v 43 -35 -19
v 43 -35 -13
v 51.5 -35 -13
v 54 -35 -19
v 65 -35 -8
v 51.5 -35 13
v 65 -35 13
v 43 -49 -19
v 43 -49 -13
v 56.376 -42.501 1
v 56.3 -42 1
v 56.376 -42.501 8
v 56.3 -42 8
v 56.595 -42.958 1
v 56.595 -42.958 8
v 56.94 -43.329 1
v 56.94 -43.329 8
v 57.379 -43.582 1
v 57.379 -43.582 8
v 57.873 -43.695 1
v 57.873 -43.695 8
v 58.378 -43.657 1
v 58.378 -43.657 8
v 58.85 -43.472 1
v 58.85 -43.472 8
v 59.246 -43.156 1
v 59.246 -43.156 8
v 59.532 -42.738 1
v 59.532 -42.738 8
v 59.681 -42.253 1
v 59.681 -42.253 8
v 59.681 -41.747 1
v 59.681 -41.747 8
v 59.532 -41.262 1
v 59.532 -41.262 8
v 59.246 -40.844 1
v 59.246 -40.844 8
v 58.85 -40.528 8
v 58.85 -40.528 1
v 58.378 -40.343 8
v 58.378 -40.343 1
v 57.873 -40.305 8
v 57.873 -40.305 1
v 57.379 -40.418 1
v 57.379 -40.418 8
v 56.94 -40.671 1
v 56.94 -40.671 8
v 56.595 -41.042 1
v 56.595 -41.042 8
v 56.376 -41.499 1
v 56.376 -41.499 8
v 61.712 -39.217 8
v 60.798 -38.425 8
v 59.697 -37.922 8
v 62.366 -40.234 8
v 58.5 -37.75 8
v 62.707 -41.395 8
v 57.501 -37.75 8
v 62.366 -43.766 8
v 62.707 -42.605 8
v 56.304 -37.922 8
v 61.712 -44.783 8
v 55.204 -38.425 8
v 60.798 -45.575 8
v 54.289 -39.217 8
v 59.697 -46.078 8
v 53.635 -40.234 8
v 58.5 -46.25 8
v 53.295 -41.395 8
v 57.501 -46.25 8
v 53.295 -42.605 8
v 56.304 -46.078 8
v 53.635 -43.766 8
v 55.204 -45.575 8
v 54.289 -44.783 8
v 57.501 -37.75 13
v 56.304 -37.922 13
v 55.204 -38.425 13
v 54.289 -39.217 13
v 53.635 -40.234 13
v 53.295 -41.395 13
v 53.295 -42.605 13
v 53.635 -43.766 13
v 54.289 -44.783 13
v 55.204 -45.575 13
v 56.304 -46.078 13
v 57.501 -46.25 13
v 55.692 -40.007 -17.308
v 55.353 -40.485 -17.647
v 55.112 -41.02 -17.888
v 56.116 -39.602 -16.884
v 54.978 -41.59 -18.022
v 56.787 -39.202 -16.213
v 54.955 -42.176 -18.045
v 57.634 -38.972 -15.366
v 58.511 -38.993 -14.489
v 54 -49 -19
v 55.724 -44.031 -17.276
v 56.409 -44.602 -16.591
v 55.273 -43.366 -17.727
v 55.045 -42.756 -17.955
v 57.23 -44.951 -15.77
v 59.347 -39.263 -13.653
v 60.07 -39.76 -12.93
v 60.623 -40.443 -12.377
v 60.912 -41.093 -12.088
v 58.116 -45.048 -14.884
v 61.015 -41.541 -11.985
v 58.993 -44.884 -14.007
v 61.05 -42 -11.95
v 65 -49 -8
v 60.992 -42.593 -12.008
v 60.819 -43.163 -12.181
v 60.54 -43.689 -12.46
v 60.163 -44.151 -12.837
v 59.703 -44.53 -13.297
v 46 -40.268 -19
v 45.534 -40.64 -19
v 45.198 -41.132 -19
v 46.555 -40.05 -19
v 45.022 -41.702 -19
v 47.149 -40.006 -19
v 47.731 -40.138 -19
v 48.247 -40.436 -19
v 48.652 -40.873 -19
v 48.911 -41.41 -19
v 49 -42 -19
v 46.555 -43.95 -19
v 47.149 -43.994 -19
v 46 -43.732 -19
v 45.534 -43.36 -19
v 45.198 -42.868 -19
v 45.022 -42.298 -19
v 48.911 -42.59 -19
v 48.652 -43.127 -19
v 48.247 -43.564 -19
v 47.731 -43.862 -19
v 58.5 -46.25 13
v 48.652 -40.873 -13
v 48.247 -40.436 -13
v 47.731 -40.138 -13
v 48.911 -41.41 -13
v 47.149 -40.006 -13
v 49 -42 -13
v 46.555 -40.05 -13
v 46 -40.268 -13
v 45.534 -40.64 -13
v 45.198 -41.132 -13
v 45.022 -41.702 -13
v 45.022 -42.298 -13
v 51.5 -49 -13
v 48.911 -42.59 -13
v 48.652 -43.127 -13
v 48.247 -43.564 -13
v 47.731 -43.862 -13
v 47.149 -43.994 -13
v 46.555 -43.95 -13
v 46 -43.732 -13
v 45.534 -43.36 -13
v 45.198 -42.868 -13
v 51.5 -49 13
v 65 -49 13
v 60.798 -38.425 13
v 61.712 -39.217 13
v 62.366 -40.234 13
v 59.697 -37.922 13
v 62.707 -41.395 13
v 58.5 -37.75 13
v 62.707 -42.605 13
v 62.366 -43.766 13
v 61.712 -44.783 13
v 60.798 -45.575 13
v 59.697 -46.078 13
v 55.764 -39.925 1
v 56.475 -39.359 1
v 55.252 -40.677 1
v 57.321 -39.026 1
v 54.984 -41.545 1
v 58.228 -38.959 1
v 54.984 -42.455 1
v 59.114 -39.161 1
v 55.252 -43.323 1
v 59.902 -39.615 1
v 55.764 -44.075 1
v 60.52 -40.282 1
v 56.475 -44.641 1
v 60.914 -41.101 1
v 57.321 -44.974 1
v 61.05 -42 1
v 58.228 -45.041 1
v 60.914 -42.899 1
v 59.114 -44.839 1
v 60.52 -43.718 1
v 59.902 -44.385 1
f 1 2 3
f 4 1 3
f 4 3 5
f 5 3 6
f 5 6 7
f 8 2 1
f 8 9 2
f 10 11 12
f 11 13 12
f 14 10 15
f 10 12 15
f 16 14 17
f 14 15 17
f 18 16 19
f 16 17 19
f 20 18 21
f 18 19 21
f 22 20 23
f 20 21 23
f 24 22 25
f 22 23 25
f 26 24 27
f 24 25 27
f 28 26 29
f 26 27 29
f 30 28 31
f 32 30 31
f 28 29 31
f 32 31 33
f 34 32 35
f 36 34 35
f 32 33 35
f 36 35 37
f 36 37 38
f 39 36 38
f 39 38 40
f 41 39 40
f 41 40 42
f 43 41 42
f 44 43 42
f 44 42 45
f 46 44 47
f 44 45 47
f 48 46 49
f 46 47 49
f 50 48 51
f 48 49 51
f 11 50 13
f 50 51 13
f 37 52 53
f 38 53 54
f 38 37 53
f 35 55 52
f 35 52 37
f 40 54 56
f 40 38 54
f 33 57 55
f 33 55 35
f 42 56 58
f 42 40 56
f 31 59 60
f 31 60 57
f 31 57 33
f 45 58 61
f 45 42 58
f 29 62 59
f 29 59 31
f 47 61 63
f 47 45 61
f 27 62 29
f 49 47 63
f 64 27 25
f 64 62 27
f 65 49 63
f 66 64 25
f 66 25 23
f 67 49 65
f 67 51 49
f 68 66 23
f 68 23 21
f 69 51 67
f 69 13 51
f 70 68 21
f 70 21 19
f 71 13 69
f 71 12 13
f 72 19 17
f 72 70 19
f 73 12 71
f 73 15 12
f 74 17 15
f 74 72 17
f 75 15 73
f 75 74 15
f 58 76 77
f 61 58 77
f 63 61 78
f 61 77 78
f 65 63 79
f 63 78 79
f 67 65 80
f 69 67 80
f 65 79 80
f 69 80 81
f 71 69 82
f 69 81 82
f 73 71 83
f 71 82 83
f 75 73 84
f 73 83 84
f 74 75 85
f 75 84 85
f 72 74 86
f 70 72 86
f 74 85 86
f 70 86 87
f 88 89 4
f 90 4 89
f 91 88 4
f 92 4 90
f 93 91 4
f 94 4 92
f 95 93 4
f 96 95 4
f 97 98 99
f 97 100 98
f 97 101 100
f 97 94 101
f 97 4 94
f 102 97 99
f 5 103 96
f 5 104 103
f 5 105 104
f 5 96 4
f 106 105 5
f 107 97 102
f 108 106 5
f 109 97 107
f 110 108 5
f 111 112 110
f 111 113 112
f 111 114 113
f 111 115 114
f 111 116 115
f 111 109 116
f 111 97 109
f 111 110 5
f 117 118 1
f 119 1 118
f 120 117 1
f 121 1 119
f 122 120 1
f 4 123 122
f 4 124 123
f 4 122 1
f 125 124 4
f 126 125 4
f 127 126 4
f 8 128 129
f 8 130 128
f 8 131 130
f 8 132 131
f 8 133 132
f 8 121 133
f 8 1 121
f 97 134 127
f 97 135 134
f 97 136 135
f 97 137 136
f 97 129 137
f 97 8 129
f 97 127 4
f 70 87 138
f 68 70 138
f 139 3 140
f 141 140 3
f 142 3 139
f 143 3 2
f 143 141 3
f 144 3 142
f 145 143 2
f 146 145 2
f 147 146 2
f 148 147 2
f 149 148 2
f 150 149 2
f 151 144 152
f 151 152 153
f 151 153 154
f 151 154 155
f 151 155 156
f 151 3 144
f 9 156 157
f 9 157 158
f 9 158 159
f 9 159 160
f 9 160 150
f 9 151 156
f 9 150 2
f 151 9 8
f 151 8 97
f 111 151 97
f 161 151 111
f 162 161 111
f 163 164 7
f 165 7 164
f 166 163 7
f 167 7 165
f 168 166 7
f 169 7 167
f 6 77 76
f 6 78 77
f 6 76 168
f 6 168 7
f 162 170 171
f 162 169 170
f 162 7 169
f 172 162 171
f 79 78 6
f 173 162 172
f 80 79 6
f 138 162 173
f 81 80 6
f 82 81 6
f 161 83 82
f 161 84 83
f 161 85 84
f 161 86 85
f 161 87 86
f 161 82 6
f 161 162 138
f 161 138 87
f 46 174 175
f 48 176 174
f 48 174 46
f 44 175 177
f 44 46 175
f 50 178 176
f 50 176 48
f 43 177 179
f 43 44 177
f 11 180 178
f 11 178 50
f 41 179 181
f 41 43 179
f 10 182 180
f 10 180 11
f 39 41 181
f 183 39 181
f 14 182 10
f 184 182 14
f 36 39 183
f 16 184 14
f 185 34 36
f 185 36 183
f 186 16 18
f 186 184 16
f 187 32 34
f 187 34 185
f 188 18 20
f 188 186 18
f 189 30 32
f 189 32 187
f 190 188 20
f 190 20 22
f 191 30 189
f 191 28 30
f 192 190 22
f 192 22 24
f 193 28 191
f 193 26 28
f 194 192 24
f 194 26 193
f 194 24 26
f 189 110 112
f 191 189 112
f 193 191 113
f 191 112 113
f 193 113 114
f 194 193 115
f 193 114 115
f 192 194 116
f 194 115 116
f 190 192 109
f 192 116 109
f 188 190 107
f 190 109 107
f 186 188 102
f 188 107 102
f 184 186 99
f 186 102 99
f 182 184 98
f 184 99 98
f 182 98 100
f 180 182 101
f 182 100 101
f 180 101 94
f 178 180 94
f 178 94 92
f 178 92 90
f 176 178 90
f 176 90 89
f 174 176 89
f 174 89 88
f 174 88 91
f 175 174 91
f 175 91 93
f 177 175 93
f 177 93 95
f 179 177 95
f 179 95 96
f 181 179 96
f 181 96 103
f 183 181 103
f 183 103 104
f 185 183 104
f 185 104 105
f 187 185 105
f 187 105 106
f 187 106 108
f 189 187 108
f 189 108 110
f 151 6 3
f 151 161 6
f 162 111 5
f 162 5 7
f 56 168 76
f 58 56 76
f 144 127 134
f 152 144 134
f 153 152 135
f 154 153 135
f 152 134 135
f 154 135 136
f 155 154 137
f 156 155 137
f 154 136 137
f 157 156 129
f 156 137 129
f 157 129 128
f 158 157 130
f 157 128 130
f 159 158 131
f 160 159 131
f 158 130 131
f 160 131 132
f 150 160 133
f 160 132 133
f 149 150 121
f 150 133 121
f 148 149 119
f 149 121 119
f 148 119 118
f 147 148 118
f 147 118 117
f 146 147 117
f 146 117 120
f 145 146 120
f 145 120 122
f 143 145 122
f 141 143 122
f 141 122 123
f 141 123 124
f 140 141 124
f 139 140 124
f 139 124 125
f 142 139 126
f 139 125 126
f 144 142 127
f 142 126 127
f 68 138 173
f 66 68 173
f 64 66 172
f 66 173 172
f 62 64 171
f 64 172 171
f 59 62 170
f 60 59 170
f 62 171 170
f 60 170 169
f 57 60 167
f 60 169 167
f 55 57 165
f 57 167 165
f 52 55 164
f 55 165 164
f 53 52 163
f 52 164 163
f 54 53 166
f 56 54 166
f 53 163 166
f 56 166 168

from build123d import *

# Parameters (mm, degrees)
PAD002_DEPTH     = 7
POCKET003_DEPTH  = 5
HOLE_D           = 3.4
HOLE_CBORE_D     = 6.1
HOLE_CBORE_DEPTH = 20
SKETCH007_R      = 2
POCKET004_DEPTH  = 6


with BuildPart() as part:
    # Sketch005 → Pad002 (new body, symmetric)
    with BuildSketch(Plane.XZ.offset(2)):
        Polygon((43, -13), (43, -19), (54, -19), (65, -8), (65, 13), (51.500001, 13), (51.500001, -13), align=None)
    extrude(amount=PAD002_DEPTH, both=True)

    # Sketch008 → Pocket003 (cut)
    with BuildSketch(Plane(origin=(0, 0, 13), x_dir=(-1, 0, 0), z_dir=(0, 0, 1))):
        with BuildLine():
            ThreePointArc((-57.501297, -2.25), (-53.251297, 2), (-57.501297, 6.25))
            Line((-57.501297, 6.25), (-58.500001, 6.25))
            ThreePointArc((-58.500001, 6.25), (-62.750001, 2), (-58.500001, -2.25))
            Line((-58.500001, -2.25), (-57.501297, -2.25))
        make_face()
    extrude(amount=-POCKET003_DEPTH, mode=Mode.SUBTRACT)

    # Hole (through all)
    with Locations(Plane(origin=(0, 0, -19), x_dir=(1, 0, 0), z_dir=(0, 0, -1))):
        with Locations((58, 2)):
            CounterBoreHole(HOLE_D / 2, HOLE_CBORE_D / 2, HOLE_CBORE_DEPTH)

    # Sketch007 (on Face2 of Pad002) → Pocket004 (cut)
    with BuildSketch(Plane(origin=(0, 0, -19), x_dir=(1, 0, 0), z_dir=(0, 0, -1))):
        with Locations((47, 2)):
            Circle(SKETCH007_R)
    extrude(amount=-POCKET004_DEPTH, mode=Mode.SUBTRACT)


with BuildPart() as part_1:
    # Body001 placement: moved
    add(part.part.moved(Location((0, -40, 0))))


solid = part_1.part
